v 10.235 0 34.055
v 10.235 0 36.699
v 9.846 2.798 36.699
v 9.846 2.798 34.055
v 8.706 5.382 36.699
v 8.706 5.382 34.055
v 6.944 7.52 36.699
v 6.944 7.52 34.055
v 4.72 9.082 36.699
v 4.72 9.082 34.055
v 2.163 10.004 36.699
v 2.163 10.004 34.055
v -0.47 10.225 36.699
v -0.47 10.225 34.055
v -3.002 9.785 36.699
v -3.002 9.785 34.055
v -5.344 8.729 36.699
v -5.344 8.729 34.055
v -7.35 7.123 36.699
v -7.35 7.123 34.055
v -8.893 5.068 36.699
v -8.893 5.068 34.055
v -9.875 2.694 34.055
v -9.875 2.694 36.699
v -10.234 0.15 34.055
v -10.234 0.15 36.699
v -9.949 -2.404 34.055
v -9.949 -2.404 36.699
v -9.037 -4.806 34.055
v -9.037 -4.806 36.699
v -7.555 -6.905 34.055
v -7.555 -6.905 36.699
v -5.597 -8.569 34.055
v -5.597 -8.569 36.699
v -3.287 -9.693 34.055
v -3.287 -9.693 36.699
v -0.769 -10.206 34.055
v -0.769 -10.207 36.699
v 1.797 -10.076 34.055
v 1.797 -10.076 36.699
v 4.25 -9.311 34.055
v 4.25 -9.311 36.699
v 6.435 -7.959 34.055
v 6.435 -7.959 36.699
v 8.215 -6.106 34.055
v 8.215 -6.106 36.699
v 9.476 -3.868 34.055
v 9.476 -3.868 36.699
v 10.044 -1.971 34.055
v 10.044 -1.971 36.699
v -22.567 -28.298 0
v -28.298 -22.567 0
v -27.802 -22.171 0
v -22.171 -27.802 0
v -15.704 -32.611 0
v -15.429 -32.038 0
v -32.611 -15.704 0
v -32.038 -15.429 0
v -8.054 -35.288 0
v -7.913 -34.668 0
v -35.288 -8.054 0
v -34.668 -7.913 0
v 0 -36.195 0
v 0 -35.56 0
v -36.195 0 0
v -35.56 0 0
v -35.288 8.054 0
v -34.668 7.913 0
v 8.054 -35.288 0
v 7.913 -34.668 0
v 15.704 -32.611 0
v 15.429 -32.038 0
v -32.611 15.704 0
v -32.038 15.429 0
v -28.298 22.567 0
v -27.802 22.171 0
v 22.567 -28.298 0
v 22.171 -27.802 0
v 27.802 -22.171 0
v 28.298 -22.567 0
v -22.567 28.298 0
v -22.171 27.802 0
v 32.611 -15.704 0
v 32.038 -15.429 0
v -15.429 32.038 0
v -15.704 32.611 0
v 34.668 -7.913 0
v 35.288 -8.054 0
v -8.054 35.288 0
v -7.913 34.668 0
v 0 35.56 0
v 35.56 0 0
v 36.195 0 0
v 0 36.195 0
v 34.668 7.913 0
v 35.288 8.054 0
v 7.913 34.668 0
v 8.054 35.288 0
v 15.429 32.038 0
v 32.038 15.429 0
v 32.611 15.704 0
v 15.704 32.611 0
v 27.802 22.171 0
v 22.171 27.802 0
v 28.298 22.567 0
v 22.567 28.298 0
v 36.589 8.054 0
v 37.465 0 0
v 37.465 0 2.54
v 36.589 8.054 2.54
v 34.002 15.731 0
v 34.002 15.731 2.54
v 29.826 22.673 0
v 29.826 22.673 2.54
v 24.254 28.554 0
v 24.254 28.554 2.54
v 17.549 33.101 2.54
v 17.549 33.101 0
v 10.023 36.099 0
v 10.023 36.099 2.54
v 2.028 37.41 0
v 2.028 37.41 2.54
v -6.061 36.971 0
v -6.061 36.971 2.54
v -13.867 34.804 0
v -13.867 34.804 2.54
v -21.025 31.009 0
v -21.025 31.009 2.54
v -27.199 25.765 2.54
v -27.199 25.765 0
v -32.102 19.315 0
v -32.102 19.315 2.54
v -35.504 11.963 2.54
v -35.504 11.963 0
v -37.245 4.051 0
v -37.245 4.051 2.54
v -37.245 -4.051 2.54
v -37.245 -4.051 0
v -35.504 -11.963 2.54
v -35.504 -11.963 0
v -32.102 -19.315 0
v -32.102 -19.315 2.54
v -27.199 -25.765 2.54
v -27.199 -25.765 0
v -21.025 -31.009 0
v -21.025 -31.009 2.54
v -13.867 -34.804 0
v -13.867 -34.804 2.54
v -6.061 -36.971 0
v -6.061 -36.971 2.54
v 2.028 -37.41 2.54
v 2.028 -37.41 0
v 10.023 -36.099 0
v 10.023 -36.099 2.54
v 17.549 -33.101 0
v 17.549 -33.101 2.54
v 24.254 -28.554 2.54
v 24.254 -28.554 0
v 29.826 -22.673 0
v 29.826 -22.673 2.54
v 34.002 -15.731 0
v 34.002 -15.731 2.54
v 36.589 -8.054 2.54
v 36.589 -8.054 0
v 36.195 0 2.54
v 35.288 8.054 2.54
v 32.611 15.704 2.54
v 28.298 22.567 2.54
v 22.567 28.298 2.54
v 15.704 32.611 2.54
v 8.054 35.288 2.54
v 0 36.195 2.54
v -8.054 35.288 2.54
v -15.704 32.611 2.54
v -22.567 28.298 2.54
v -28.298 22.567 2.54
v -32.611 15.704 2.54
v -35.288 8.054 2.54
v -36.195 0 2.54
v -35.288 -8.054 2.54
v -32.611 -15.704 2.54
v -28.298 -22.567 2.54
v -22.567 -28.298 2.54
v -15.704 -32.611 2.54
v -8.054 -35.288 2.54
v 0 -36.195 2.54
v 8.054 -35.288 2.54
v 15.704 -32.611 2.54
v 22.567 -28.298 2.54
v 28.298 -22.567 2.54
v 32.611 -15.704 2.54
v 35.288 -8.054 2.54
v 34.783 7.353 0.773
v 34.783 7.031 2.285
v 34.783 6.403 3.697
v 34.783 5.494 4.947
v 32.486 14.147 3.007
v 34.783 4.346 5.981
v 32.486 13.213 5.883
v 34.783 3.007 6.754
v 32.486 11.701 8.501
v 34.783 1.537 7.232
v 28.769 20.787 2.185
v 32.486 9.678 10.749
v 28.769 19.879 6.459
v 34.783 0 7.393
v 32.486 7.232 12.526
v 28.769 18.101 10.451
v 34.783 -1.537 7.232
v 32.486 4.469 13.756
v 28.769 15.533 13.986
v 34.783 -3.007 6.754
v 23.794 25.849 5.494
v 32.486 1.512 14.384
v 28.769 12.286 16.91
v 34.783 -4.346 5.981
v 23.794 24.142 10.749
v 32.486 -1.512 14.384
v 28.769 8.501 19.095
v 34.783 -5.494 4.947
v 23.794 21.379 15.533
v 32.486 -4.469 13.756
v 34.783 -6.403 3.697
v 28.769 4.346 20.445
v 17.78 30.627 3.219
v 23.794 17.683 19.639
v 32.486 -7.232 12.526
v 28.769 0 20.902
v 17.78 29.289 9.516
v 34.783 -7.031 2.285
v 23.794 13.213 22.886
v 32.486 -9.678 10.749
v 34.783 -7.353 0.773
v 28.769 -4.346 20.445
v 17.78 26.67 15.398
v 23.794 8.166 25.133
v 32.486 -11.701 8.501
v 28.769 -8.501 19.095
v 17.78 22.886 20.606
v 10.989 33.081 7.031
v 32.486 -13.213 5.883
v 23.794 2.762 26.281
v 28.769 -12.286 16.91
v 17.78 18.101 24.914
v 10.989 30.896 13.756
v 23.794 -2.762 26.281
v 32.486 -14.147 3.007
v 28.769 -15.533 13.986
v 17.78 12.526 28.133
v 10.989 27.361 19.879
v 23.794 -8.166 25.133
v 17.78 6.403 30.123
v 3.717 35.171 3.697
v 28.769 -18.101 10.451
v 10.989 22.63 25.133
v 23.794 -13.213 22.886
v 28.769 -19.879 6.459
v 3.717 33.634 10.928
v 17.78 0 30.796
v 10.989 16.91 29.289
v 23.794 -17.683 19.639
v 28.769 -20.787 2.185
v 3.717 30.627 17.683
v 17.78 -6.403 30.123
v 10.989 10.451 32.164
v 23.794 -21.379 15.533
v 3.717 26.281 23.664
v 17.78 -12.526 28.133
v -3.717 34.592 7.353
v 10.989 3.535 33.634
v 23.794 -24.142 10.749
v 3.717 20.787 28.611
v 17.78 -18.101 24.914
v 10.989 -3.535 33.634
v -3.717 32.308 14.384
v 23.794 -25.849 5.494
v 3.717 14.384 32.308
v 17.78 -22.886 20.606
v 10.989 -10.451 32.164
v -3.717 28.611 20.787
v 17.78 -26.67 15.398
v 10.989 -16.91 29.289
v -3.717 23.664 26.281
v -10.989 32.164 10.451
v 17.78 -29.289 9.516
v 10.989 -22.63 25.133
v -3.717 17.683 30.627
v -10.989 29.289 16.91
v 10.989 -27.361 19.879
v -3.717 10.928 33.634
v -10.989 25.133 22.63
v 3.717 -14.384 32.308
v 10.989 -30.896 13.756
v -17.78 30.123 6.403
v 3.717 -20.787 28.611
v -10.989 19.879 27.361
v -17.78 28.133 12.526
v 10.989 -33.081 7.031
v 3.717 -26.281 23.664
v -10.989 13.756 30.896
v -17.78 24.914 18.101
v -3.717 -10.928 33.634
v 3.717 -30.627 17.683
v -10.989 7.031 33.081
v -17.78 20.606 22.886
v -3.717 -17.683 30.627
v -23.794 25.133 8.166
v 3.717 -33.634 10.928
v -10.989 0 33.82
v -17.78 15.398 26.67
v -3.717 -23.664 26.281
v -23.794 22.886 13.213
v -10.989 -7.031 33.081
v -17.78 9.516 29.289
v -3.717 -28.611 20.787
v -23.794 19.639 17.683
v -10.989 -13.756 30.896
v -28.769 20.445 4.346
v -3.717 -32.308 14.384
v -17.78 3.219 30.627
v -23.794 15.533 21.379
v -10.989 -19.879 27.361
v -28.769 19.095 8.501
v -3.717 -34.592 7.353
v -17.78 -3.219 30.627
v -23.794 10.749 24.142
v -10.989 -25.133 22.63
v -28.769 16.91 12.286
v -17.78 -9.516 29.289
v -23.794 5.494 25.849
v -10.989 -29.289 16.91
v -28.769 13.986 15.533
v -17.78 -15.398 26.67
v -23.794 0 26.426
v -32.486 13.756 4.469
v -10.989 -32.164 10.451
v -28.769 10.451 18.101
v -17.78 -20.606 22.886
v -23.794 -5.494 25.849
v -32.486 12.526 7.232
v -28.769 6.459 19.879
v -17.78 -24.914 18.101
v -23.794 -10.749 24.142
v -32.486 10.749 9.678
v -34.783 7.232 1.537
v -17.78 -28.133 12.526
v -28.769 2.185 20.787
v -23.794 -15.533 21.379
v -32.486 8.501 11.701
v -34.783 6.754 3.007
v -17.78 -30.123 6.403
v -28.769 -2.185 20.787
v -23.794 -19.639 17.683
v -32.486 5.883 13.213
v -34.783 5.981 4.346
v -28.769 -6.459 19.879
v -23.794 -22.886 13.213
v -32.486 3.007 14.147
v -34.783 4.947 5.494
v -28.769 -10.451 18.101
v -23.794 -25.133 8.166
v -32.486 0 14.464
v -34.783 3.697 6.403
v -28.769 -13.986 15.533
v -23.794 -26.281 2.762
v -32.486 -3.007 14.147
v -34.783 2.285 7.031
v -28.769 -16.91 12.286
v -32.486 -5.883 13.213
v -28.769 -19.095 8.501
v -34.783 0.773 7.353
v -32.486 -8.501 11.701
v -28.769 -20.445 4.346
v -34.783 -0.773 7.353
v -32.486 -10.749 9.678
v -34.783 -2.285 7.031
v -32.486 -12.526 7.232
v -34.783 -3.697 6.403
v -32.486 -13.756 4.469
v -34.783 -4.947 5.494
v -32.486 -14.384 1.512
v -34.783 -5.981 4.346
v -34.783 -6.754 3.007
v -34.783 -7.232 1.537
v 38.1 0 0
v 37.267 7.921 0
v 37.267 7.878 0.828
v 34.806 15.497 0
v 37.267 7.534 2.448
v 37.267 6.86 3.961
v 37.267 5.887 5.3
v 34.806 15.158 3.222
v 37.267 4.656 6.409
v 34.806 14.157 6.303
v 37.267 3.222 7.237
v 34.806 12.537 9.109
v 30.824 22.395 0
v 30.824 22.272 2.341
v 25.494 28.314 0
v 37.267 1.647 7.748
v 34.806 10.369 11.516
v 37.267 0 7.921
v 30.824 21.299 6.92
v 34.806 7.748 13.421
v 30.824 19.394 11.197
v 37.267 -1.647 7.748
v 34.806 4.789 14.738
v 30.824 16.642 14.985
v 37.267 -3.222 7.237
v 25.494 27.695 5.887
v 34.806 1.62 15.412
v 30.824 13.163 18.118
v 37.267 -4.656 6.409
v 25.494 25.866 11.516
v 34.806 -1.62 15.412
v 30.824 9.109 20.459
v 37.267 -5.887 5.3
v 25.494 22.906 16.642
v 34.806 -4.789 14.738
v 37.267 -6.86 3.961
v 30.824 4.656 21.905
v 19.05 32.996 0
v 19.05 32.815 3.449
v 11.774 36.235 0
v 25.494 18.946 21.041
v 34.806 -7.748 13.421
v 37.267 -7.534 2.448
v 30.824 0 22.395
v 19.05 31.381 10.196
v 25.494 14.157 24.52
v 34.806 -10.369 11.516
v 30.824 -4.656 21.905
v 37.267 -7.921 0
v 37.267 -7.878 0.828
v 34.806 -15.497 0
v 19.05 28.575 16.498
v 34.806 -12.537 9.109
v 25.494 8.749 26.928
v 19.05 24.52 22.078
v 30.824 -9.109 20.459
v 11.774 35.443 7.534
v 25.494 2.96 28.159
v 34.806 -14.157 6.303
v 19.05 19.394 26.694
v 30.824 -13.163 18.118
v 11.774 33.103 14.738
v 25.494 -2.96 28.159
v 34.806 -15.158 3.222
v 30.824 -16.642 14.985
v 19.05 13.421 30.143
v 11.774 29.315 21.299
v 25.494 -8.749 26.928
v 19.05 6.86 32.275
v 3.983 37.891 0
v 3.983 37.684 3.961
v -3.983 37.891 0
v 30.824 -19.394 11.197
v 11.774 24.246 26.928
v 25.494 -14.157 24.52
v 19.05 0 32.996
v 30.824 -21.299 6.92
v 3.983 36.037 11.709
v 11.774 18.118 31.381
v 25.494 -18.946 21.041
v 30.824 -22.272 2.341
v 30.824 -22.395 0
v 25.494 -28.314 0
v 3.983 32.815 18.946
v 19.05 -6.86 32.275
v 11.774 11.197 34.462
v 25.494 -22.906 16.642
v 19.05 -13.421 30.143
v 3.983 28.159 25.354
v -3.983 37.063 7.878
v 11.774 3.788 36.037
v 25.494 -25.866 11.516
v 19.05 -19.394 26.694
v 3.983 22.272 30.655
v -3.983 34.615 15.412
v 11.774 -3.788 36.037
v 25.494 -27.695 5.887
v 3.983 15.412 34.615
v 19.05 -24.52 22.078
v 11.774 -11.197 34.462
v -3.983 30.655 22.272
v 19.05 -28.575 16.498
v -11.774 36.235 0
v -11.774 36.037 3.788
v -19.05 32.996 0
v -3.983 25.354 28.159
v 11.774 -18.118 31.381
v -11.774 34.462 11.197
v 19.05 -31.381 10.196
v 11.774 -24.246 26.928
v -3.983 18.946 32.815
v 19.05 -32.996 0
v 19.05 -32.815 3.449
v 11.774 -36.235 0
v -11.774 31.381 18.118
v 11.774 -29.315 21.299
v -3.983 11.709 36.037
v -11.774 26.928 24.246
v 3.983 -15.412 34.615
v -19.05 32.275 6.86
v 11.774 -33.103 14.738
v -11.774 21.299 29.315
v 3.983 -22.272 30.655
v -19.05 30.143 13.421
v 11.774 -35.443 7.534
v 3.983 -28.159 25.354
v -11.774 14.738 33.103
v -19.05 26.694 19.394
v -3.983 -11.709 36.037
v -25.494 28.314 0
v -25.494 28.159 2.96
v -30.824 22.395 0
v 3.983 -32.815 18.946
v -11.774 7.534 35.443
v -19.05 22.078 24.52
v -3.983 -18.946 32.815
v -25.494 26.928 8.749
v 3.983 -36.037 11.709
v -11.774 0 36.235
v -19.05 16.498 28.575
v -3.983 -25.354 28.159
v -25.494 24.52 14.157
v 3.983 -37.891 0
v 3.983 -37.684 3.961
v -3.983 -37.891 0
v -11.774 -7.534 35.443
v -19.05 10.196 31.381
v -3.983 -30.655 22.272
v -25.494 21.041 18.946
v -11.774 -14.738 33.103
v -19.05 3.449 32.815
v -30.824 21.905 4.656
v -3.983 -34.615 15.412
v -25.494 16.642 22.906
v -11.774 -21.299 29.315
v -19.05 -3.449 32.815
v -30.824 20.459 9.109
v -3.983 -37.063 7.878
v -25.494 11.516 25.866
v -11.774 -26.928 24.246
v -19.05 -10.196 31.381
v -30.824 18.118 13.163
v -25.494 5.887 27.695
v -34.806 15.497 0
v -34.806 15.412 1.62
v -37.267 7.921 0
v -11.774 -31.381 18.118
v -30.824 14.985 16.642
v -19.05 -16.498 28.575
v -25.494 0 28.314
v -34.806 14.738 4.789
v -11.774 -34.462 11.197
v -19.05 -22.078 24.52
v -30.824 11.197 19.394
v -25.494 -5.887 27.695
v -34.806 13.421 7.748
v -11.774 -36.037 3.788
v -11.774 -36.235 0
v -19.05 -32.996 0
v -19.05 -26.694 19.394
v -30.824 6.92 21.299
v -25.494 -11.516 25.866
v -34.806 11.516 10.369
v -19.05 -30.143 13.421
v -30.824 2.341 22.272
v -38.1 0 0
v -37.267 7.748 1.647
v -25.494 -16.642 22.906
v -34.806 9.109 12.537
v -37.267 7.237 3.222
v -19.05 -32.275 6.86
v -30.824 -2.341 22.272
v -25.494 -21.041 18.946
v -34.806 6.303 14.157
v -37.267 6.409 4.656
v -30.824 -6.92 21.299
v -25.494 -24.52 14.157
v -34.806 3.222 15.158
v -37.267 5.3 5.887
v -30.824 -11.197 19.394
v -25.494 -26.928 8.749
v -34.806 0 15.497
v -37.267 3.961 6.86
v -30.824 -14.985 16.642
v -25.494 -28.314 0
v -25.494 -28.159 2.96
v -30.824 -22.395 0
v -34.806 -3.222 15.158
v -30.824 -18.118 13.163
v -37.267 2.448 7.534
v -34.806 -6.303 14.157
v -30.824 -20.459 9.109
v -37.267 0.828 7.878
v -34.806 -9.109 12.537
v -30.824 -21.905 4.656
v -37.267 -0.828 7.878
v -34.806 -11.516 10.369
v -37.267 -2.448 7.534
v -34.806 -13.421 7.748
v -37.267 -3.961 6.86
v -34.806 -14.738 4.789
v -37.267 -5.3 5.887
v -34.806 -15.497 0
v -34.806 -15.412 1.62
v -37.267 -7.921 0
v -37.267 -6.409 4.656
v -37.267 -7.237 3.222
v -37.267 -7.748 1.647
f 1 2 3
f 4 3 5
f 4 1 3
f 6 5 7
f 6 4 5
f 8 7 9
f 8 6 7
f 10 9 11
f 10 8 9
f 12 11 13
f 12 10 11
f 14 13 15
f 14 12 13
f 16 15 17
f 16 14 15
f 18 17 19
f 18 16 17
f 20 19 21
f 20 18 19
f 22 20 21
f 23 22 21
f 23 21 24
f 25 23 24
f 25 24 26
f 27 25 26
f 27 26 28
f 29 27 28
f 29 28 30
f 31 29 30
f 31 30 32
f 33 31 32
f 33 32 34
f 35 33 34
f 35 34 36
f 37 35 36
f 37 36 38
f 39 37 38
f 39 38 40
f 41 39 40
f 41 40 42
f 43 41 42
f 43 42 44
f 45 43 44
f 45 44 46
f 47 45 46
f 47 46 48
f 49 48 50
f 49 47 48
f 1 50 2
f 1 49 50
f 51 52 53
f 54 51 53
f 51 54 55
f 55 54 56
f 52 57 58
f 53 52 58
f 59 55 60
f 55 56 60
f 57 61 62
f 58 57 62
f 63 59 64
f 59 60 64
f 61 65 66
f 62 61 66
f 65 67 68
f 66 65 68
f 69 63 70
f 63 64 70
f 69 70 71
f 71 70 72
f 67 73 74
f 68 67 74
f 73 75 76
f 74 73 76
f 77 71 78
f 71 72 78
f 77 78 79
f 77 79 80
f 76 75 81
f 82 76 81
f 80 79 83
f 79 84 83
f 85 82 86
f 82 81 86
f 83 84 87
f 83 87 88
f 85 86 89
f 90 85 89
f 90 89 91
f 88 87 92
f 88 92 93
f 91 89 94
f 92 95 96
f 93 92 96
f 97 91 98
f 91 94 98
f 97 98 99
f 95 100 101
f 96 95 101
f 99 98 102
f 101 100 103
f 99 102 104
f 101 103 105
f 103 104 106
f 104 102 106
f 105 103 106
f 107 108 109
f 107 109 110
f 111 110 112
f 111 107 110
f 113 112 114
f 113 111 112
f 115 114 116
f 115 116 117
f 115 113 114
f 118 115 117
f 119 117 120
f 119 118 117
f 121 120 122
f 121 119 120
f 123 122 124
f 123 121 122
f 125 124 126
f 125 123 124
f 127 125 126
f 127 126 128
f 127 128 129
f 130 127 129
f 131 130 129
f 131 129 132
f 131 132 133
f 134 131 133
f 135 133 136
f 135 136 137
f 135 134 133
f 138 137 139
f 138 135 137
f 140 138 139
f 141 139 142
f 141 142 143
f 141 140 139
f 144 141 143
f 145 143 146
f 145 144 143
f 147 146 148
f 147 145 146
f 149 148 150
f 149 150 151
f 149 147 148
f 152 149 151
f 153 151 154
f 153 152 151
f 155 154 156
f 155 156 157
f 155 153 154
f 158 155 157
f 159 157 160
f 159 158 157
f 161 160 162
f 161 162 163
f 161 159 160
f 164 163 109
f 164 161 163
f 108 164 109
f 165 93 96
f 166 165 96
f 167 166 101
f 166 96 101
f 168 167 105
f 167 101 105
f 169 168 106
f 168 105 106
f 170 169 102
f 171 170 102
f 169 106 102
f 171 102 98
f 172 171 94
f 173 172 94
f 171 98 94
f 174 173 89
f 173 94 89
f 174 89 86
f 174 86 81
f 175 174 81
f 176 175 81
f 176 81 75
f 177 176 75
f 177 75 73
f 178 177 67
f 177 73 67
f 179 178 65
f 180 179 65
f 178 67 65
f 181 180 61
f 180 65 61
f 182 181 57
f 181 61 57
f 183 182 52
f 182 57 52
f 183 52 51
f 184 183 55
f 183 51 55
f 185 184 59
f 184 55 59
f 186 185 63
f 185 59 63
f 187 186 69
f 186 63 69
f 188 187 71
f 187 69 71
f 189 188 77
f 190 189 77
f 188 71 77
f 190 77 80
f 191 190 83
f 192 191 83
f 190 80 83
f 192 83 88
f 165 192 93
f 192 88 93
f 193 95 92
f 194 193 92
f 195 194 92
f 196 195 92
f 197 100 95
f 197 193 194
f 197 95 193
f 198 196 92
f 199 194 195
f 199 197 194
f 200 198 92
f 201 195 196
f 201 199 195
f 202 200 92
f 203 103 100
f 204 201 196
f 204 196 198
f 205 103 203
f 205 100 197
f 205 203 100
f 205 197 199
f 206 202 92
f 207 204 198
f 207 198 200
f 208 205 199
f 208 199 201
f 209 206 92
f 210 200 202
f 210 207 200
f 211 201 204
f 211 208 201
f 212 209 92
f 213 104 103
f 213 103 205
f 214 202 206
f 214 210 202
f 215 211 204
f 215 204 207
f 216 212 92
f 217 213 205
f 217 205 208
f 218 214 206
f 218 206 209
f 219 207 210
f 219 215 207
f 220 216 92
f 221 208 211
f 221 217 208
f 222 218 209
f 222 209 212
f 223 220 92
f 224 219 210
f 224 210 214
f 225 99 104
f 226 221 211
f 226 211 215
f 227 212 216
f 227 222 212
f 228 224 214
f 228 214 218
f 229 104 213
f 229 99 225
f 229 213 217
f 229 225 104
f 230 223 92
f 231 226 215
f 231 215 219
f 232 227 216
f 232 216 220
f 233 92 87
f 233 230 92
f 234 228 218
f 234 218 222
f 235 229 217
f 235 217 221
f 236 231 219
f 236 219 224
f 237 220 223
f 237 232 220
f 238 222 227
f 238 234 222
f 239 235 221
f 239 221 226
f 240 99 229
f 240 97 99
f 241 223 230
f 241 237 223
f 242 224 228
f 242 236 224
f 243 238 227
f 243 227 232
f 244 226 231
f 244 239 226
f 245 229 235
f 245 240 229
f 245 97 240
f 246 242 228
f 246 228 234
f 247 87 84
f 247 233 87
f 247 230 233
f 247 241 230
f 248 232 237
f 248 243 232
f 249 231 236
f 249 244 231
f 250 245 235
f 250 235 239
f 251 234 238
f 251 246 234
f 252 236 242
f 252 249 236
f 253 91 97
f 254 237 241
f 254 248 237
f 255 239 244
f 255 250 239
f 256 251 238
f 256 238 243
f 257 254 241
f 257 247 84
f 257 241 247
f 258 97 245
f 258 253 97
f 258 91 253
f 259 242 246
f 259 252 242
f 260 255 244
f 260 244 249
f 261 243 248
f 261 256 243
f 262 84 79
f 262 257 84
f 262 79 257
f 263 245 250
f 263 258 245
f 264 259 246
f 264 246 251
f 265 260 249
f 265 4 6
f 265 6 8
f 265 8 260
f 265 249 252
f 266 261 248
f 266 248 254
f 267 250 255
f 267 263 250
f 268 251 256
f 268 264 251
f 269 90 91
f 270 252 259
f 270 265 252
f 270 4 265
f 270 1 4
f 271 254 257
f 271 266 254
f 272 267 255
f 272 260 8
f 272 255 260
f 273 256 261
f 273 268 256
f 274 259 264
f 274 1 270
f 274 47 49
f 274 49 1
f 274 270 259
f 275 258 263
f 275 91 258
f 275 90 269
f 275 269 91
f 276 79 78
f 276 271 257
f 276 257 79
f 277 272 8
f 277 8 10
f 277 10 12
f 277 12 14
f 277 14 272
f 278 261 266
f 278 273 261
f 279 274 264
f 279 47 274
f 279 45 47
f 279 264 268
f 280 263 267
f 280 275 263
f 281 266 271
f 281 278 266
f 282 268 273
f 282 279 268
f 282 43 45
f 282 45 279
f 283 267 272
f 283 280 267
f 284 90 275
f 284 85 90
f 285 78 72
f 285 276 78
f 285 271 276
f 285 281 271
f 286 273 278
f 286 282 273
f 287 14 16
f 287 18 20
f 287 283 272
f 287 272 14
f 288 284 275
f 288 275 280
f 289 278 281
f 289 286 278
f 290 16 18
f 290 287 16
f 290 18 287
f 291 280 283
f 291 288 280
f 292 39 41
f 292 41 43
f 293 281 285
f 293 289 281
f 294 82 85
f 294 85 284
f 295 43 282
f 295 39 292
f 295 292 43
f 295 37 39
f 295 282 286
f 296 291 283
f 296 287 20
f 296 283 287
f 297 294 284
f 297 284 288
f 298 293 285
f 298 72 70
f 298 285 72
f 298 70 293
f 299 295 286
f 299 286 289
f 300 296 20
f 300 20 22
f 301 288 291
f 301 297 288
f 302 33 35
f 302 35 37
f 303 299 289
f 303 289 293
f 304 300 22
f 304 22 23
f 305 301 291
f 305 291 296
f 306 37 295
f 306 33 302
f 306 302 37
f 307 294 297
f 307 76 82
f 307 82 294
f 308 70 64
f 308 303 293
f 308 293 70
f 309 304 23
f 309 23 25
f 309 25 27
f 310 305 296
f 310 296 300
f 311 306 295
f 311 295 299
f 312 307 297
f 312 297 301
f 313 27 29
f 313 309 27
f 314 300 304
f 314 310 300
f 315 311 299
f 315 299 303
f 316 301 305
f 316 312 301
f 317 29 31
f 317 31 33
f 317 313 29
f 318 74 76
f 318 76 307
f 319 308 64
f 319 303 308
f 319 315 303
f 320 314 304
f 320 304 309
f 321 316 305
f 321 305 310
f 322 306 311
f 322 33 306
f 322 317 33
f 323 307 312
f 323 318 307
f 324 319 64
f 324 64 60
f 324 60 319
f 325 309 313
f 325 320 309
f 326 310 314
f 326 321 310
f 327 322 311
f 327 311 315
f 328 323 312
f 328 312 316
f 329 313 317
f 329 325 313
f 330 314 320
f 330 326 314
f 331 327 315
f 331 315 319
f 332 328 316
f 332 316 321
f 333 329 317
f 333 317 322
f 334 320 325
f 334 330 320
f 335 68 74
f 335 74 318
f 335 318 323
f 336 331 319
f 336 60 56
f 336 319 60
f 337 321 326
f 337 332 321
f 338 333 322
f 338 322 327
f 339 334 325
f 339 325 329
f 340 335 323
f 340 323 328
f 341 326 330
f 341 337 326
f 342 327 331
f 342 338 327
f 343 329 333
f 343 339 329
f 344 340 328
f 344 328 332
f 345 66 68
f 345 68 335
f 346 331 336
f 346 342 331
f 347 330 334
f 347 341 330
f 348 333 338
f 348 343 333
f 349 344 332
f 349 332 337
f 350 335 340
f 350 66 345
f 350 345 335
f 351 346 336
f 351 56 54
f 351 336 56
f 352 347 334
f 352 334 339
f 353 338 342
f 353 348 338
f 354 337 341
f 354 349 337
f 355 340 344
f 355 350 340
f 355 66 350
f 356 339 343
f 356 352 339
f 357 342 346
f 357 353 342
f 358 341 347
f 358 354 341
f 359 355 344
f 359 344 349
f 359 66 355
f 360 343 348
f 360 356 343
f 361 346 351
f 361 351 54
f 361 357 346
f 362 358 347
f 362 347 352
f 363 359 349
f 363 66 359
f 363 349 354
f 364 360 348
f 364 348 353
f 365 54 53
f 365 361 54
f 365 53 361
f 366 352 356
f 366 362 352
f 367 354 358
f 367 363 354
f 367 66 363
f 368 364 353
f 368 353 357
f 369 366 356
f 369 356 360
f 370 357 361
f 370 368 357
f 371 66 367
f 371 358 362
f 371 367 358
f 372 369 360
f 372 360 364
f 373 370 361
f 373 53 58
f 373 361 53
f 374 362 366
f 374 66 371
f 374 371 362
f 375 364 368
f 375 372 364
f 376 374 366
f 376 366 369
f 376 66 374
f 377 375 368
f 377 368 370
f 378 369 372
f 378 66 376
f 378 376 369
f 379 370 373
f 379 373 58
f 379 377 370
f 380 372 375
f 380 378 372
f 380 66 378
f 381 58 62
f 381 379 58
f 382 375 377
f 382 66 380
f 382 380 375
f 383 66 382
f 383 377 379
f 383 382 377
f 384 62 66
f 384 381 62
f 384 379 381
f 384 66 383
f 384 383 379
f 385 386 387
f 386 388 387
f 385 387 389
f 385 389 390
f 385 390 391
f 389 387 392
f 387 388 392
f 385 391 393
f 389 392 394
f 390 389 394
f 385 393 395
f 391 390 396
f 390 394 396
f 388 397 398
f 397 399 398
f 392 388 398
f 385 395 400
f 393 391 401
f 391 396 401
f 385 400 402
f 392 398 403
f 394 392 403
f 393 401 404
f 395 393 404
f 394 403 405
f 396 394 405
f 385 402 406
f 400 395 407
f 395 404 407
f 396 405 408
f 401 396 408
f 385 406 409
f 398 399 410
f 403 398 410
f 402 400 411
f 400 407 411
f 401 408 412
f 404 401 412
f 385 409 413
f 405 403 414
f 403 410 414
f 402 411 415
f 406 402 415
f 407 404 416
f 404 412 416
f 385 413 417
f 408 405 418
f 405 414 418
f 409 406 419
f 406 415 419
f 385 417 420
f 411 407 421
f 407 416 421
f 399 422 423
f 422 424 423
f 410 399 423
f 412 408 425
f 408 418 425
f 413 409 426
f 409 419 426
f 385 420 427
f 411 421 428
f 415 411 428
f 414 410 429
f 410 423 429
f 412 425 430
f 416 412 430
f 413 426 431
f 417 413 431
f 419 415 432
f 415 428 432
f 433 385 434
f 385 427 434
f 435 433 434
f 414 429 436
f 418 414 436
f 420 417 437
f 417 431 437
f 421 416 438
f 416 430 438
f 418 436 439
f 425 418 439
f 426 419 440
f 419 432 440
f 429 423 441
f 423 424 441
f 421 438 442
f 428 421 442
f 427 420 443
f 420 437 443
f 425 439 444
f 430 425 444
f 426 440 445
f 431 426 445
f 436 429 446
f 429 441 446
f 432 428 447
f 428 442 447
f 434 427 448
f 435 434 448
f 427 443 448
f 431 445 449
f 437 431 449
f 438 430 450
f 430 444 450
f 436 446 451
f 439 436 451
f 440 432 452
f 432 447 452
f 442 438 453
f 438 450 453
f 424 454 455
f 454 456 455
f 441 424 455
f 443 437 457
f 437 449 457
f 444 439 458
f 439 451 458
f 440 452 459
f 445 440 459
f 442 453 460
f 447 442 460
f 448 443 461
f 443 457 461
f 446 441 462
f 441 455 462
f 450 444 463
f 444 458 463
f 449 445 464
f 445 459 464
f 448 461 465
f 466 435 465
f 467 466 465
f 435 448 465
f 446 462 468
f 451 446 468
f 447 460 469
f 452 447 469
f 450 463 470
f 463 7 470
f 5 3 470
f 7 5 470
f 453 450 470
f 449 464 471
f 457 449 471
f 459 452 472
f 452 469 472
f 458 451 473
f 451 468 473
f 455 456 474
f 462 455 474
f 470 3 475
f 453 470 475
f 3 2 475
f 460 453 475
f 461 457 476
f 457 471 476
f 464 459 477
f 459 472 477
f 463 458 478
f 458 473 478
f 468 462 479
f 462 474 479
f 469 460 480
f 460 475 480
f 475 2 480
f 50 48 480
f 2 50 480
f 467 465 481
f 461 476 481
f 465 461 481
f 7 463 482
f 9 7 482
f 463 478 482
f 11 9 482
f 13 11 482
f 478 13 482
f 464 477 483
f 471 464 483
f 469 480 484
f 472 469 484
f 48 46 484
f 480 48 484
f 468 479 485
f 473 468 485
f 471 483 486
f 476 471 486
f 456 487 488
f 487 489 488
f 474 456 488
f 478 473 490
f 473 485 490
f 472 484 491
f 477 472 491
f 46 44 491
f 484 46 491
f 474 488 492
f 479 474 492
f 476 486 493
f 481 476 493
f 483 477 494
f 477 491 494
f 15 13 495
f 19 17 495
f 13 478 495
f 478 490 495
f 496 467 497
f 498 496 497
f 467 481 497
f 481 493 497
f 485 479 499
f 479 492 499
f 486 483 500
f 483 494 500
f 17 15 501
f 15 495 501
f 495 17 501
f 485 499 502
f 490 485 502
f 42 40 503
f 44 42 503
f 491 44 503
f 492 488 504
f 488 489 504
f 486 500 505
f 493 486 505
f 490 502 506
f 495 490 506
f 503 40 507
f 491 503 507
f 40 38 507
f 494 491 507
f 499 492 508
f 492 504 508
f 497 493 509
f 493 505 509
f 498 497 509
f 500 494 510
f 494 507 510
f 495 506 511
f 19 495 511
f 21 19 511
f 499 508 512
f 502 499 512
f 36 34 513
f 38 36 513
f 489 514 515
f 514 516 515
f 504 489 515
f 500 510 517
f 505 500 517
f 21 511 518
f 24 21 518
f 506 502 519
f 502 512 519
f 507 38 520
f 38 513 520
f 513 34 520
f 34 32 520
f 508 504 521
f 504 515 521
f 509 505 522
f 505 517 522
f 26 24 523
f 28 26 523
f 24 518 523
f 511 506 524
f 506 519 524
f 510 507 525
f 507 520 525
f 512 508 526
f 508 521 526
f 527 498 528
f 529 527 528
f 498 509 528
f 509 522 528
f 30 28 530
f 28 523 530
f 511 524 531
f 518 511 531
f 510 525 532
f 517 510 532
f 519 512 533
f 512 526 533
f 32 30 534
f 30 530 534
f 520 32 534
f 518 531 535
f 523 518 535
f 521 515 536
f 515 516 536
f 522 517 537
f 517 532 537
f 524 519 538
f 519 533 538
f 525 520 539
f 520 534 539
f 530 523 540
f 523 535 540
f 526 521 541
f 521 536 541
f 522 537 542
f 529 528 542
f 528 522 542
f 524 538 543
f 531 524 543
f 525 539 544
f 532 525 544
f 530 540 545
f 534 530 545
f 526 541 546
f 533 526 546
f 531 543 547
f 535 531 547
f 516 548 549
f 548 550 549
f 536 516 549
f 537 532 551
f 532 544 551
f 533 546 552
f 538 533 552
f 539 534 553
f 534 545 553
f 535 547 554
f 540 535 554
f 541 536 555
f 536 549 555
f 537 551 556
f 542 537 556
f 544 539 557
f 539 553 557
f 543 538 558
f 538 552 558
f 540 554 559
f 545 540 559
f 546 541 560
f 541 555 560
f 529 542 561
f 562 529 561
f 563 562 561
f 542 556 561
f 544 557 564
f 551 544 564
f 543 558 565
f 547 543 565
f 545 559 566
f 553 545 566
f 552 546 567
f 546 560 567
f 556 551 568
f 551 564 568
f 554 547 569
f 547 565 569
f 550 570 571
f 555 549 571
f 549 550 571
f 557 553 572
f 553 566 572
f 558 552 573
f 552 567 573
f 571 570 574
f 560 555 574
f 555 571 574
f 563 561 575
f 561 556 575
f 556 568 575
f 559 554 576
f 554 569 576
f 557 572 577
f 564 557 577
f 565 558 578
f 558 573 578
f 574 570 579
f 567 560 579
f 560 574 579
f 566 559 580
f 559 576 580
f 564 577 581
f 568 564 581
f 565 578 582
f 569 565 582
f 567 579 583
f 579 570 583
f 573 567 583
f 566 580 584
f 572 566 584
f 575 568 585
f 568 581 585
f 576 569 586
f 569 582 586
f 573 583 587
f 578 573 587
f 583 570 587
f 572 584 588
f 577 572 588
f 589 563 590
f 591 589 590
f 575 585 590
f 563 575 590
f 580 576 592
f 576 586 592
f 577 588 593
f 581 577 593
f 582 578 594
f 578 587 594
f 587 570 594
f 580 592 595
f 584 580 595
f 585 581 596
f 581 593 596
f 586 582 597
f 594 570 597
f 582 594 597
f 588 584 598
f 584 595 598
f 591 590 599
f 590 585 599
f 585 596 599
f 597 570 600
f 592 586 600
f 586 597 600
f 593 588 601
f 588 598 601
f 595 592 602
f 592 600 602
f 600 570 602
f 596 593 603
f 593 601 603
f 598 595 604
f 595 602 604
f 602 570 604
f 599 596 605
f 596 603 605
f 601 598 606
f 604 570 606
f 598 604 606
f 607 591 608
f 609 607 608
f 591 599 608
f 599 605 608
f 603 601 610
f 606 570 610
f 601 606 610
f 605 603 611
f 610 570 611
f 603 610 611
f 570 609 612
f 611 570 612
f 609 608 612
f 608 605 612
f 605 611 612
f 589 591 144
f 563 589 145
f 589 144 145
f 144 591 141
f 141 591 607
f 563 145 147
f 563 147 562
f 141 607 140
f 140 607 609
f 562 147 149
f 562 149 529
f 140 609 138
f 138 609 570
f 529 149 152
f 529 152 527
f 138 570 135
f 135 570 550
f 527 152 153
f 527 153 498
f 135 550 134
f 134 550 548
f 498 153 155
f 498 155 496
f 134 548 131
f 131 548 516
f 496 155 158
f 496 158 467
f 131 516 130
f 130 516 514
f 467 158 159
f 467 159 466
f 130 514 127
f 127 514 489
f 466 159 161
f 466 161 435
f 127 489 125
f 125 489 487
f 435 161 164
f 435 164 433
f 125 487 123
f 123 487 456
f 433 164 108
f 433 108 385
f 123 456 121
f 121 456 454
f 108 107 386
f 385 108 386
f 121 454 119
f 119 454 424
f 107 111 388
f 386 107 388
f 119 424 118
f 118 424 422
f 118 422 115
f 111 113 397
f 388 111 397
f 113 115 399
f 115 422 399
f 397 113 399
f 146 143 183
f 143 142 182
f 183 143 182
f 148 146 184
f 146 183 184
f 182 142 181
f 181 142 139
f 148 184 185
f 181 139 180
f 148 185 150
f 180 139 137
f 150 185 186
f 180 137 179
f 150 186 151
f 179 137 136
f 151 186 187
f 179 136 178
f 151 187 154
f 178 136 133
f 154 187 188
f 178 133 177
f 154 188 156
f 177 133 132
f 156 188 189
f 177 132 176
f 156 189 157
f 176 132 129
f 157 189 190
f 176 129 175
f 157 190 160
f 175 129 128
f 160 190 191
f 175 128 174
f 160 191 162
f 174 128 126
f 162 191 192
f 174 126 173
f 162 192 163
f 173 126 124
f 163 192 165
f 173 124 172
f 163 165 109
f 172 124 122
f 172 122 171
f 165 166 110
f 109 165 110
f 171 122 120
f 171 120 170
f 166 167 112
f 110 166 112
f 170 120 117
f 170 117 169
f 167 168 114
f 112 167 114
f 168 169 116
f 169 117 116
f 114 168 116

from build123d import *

# Parameters (mm, degrees)
F1_ANGLE = 180
F2_T     = -2.54
F3_R     = 37.465
F3_R_2   = 36.195
F4_DEPTH = 2.54
F5_R     = 10.23543
F6_DEPTH = 101.6


with BuildPart() as f1:
    # F0 (on Top) → F1 (revolve)
    with BuildSketch(Plane.XY):
        with BuildLine():
            Line((-38.1, 0), (38.1, 0))
            ThreePointArc((38.1, 0), (0, 38.1), (-38.1, 0))
        make_face()
    revolve(axis=Axis((0, 0, 0), (1, 0, 0)), revolution_arc=F1_ANGLE)

    # F2
    f2_openings = [f1.faces().sort_by_distance(p)[0] for p in [
        (0, 0, 0),
    ]]
    offset(amount=F2_T, openings=f2_openings)

    # F3 (on Top) → F4 (cut)
    with BuildSketch(Plane.XY):
        Circle(F3_R)
        Circle(F3_R_2, mode=Mode.SUBTRACT)
    extrude(amount=F4_DEPTH, mode=Mode.SUBTRACT)

    # F5 (on Top) → F6 (cut)
    with BuildSketch(Plane.XY):
        Circle(F5_R)
    extrude(amount=F6_DEPTH, mode=Mode.SUBTRACT)


solid = f1.part
